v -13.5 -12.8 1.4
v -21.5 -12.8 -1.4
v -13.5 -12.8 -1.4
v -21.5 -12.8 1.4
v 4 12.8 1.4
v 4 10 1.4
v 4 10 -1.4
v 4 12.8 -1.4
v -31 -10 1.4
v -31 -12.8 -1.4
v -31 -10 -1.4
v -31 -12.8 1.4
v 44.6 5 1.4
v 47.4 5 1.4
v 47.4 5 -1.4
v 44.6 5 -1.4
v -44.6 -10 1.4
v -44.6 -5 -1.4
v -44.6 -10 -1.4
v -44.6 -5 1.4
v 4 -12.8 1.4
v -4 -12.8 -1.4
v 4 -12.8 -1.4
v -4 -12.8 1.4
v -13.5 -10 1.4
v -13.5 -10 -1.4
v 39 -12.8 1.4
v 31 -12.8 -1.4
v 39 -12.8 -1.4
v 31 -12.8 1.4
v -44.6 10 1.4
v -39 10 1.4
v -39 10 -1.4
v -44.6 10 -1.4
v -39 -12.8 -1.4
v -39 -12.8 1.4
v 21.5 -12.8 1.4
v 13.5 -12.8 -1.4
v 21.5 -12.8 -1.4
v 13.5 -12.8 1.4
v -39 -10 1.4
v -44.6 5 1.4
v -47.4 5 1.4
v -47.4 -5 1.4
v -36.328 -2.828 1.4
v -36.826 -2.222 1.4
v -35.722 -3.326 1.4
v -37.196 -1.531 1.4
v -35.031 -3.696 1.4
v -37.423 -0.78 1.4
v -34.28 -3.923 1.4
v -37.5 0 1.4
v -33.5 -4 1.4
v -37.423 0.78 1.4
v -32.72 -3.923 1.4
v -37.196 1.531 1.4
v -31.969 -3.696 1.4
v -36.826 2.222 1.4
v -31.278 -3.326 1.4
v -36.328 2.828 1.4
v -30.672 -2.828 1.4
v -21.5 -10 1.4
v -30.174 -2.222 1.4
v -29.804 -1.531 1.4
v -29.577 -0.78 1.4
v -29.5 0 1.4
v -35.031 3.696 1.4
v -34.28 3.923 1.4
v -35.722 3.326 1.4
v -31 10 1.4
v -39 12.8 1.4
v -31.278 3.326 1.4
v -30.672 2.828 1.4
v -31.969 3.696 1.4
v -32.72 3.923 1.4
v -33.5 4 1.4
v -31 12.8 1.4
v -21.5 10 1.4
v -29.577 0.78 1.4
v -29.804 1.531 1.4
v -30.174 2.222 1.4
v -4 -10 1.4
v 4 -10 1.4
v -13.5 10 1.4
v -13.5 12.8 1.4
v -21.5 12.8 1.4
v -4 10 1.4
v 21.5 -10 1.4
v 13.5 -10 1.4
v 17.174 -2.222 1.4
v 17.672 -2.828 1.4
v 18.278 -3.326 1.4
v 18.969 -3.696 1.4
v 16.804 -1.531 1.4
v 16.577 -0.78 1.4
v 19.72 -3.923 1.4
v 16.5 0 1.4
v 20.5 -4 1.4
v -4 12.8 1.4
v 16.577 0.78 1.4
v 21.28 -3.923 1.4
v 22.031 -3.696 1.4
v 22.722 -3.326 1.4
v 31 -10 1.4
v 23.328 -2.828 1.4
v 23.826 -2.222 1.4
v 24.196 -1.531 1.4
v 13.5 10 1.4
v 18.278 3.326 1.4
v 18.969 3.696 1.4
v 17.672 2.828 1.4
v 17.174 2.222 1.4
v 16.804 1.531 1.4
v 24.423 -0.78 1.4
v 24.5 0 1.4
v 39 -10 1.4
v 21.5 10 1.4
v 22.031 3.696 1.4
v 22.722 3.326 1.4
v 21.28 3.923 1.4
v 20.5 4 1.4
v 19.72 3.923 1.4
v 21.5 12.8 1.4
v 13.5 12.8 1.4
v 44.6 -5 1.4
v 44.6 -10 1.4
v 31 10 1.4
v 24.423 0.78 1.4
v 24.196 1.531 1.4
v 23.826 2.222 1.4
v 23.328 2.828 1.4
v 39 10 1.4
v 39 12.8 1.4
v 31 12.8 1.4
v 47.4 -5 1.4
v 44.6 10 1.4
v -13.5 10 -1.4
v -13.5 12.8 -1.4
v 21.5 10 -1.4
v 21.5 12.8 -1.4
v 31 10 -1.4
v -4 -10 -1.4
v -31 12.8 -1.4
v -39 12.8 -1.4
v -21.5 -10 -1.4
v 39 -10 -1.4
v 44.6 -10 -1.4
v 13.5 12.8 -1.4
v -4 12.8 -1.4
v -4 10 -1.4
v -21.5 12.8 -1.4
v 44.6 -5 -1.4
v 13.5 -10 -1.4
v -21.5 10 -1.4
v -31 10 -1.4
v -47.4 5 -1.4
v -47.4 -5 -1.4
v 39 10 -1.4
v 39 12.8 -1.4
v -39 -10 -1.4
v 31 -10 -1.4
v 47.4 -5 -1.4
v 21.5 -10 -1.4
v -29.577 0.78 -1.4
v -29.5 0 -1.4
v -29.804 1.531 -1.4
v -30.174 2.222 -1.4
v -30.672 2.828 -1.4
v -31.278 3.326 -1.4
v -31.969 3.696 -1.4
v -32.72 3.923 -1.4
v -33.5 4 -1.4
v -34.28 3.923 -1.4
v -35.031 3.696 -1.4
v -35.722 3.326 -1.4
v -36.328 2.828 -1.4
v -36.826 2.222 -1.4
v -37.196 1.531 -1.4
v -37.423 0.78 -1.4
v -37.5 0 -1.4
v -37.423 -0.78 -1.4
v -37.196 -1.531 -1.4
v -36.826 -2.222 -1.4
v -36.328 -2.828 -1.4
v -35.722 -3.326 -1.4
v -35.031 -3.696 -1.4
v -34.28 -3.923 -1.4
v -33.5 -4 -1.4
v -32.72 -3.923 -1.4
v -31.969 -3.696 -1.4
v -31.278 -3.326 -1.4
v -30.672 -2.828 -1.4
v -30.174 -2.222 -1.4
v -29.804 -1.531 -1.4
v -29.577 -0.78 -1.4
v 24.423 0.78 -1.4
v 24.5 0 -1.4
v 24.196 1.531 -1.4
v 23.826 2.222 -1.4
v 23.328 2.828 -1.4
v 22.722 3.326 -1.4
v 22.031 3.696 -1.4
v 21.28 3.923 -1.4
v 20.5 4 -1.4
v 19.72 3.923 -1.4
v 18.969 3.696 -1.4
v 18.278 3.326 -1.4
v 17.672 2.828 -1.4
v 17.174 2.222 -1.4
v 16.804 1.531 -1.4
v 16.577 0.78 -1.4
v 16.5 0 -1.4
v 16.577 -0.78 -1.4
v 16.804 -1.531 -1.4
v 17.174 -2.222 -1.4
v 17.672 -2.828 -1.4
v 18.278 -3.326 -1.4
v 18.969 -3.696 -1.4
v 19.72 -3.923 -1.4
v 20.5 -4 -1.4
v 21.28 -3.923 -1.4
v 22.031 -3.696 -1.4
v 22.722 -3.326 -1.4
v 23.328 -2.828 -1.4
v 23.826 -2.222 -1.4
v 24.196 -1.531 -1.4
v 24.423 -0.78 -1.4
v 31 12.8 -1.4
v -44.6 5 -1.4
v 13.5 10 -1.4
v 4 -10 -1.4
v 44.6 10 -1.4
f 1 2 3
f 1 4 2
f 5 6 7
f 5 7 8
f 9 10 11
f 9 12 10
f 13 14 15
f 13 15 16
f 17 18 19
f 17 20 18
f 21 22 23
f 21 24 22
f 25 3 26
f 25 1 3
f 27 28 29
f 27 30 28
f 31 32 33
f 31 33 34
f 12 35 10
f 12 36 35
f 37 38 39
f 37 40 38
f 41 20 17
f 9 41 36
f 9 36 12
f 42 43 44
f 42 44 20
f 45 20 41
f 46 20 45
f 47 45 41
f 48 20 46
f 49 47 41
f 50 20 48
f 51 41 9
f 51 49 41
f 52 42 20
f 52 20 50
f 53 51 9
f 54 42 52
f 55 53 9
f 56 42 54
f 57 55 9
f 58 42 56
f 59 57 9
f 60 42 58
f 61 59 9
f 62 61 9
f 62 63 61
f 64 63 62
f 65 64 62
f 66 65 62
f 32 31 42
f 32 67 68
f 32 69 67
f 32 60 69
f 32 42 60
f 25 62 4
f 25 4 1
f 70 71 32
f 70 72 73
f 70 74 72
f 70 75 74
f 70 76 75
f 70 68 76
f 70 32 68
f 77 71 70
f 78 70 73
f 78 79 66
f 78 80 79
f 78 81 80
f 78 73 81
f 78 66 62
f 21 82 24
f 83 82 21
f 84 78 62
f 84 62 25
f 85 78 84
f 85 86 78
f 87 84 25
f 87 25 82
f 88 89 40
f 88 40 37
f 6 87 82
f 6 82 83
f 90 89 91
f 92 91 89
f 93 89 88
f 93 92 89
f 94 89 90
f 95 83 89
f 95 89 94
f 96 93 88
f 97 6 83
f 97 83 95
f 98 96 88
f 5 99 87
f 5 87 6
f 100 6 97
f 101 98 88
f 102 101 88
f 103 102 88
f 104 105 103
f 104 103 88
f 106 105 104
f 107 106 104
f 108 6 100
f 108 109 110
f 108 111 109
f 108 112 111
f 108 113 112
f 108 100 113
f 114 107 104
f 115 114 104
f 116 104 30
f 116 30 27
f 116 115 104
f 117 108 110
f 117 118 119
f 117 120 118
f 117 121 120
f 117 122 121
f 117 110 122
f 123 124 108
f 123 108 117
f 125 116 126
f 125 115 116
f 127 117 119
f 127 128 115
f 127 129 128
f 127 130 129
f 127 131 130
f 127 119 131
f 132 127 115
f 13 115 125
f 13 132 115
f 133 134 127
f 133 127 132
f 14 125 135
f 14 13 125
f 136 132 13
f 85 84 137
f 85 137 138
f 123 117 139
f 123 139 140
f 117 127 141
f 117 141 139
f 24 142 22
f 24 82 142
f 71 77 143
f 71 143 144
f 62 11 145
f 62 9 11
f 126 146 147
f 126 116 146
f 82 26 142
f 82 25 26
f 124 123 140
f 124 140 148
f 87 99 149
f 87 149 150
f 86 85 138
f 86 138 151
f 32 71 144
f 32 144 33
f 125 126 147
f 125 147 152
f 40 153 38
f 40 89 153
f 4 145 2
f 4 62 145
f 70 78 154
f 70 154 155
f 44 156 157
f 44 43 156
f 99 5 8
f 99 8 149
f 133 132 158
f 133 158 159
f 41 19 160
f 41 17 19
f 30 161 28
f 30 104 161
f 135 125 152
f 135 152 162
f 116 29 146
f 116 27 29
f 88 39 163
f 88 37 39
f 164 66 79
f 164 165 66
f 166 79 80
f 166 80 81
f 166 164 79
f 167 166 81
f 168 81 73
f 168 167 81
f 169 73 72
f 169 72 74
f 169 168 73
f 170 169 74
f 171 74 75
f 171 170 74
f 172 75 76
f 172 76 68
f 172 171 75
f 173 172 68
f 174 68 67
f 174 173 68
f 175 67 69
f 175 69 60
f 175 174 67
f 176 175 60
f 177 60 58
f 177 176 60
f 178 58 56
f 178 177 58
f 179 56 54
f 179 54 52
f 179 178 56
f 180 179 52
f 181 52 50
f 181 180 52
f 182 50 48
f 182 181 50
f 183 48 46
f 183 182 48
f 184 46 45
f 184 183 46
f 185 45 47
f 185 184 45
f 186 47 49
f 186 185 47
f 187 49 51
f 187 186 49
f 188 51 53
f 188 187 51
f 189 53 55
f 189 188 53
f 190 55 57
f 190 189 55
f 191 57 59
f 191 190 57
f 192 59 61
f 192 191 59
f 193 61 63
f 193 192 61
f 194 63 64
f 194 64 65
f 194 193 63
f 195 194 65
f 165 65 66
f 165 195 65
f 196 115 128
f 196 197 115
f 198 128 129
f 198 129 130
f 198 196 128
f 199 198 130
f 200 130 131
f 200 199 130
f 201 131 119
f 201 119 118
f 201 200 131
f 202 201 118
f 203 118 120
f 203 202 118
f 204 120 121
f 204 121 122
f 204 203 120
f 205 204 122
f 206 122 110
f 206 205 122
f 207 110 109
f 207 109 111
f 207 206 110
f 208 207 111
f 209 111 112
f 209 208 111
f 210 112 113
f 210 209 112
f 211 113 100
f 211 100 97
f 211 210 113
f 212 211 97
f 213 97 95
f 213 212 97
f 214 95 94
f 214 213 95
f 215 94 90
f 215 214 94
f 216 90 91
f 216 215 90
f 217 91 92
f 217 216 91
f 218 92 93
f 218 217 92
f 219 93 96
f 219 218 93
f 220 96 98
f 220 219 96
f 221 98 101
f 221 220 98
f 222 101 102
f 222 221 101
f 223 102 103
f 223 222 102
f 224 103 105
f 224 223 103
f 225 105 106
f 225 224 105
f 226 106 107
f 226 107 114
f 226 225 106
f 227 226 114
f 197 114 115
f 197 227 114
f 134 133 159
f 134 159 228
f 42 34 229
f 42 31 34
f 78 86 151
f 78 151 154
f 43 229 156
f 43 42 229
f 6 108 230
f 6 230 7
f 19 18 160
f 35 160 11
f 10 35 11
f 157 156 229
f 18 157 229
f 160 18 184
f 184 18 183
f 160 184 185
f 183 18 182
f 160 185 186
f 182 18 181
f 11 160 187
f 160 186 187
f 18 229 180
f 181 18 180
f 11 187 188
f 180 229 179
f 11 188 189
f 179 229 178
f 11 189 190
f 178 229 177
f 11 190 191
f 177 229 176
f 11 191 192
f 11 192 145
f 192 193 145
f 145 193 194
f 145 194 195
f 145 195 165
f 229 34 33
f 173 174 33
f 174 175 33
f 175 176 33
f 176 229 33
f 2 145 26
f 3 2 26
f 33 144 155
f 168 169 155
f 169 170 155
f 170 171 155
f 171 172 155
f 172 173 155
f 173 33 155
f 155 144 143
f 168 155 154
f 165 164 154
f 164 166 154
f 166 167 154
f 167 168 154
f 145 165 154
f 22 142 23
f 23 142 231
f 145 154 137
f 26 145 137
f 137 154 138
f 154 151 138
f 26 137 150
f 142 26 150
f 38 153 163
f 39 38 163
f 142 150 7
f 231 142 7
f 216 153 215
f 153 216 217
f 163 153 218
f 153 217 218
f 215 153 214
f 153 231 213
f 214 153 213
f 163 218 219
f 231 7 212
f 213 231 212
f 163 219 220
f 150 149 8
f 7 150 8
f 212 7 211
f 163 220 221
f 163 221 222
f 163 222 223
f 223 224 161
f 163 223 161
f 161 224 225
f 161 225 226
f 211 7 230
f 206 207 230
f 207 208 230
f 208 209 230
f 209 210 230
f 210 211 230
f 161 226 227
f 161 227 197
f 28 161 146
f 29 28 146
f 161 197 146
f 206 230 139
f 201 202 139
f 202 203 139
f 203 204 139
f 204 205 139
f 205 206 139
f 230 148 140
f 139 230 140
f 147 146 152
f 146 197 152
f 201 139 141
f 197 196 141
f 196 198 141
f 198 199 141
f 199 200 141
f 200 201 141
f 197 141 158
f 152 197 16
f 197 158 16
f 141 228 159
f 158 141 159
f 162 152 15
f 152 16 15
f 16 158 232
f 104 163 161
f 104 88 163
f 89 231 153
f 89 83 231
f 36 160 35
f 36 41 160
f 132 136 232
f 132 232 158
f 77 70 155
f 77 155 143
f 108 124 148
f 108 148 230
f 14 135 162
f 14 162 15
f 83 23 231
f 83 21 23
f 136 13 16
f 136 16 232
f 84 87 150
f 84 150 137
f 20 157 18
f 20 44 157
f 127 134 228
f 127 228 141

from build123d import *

# Parameters (mm, degrees)
SKETCH_1_R      = 4
EXTRUDE_1_DEPTH = 1.4


with BuildPart() as part:
    # Эскиз1 → Бобышка-Вытянуть1 (new, symmetric)
    with BuildSketch(Plane.XY):
        Polygon((39, -10), (44.6, -10), (44.6, -5), (47.4, -5), (47.4, 5), (44.6, 5), (44.6, 10), (39, 10), (39, 12.8), (31, 12.8), (31, 10), (21.5, 10), (21.5, 12.8), (13.5, 12.8), (13.5, 10), (4, 10), (4, 12.8), (-4, 12.8), (-4, 10), (-13.5, 10), (-13.5, 12.8), (-21.5, 12.8), (-21.5, 10), (-31, 10), (-31, 12.8), (-39, 12.8), (-39, 10), (-44.6, 10), (-44.6, 5), (-47.4, 5), (-47.4, -5), (-44.6, -5), (-44.6, -10), (-39, -10), (-39, -12.8), (-31, -12.8), (-31, -10), (-21.5, -10), (-21.5, -12.8), (-13.5, -12.8), (-13.5, -10), (-4, -10), (-4, -12.8), (4, -12.8), (4, -10), (13.5, -10), (13.5, -12.8), (21.5, -12.8), (21.5, -10), (31, -10), (31, -12.8), (39, -12.8), align=None)
        with Locations((20.5, 0)):
            Circle(SKETCH_1_R, mode=Mode.SUBTRACT)
        with Locations((-33.5, 0)):
            Circle(SKETCH_1_R, mode=Mode.SUBTRACT)
    extrude(amount=EXTRUDE_1_DEPTH, both=True)


solid = part.part
